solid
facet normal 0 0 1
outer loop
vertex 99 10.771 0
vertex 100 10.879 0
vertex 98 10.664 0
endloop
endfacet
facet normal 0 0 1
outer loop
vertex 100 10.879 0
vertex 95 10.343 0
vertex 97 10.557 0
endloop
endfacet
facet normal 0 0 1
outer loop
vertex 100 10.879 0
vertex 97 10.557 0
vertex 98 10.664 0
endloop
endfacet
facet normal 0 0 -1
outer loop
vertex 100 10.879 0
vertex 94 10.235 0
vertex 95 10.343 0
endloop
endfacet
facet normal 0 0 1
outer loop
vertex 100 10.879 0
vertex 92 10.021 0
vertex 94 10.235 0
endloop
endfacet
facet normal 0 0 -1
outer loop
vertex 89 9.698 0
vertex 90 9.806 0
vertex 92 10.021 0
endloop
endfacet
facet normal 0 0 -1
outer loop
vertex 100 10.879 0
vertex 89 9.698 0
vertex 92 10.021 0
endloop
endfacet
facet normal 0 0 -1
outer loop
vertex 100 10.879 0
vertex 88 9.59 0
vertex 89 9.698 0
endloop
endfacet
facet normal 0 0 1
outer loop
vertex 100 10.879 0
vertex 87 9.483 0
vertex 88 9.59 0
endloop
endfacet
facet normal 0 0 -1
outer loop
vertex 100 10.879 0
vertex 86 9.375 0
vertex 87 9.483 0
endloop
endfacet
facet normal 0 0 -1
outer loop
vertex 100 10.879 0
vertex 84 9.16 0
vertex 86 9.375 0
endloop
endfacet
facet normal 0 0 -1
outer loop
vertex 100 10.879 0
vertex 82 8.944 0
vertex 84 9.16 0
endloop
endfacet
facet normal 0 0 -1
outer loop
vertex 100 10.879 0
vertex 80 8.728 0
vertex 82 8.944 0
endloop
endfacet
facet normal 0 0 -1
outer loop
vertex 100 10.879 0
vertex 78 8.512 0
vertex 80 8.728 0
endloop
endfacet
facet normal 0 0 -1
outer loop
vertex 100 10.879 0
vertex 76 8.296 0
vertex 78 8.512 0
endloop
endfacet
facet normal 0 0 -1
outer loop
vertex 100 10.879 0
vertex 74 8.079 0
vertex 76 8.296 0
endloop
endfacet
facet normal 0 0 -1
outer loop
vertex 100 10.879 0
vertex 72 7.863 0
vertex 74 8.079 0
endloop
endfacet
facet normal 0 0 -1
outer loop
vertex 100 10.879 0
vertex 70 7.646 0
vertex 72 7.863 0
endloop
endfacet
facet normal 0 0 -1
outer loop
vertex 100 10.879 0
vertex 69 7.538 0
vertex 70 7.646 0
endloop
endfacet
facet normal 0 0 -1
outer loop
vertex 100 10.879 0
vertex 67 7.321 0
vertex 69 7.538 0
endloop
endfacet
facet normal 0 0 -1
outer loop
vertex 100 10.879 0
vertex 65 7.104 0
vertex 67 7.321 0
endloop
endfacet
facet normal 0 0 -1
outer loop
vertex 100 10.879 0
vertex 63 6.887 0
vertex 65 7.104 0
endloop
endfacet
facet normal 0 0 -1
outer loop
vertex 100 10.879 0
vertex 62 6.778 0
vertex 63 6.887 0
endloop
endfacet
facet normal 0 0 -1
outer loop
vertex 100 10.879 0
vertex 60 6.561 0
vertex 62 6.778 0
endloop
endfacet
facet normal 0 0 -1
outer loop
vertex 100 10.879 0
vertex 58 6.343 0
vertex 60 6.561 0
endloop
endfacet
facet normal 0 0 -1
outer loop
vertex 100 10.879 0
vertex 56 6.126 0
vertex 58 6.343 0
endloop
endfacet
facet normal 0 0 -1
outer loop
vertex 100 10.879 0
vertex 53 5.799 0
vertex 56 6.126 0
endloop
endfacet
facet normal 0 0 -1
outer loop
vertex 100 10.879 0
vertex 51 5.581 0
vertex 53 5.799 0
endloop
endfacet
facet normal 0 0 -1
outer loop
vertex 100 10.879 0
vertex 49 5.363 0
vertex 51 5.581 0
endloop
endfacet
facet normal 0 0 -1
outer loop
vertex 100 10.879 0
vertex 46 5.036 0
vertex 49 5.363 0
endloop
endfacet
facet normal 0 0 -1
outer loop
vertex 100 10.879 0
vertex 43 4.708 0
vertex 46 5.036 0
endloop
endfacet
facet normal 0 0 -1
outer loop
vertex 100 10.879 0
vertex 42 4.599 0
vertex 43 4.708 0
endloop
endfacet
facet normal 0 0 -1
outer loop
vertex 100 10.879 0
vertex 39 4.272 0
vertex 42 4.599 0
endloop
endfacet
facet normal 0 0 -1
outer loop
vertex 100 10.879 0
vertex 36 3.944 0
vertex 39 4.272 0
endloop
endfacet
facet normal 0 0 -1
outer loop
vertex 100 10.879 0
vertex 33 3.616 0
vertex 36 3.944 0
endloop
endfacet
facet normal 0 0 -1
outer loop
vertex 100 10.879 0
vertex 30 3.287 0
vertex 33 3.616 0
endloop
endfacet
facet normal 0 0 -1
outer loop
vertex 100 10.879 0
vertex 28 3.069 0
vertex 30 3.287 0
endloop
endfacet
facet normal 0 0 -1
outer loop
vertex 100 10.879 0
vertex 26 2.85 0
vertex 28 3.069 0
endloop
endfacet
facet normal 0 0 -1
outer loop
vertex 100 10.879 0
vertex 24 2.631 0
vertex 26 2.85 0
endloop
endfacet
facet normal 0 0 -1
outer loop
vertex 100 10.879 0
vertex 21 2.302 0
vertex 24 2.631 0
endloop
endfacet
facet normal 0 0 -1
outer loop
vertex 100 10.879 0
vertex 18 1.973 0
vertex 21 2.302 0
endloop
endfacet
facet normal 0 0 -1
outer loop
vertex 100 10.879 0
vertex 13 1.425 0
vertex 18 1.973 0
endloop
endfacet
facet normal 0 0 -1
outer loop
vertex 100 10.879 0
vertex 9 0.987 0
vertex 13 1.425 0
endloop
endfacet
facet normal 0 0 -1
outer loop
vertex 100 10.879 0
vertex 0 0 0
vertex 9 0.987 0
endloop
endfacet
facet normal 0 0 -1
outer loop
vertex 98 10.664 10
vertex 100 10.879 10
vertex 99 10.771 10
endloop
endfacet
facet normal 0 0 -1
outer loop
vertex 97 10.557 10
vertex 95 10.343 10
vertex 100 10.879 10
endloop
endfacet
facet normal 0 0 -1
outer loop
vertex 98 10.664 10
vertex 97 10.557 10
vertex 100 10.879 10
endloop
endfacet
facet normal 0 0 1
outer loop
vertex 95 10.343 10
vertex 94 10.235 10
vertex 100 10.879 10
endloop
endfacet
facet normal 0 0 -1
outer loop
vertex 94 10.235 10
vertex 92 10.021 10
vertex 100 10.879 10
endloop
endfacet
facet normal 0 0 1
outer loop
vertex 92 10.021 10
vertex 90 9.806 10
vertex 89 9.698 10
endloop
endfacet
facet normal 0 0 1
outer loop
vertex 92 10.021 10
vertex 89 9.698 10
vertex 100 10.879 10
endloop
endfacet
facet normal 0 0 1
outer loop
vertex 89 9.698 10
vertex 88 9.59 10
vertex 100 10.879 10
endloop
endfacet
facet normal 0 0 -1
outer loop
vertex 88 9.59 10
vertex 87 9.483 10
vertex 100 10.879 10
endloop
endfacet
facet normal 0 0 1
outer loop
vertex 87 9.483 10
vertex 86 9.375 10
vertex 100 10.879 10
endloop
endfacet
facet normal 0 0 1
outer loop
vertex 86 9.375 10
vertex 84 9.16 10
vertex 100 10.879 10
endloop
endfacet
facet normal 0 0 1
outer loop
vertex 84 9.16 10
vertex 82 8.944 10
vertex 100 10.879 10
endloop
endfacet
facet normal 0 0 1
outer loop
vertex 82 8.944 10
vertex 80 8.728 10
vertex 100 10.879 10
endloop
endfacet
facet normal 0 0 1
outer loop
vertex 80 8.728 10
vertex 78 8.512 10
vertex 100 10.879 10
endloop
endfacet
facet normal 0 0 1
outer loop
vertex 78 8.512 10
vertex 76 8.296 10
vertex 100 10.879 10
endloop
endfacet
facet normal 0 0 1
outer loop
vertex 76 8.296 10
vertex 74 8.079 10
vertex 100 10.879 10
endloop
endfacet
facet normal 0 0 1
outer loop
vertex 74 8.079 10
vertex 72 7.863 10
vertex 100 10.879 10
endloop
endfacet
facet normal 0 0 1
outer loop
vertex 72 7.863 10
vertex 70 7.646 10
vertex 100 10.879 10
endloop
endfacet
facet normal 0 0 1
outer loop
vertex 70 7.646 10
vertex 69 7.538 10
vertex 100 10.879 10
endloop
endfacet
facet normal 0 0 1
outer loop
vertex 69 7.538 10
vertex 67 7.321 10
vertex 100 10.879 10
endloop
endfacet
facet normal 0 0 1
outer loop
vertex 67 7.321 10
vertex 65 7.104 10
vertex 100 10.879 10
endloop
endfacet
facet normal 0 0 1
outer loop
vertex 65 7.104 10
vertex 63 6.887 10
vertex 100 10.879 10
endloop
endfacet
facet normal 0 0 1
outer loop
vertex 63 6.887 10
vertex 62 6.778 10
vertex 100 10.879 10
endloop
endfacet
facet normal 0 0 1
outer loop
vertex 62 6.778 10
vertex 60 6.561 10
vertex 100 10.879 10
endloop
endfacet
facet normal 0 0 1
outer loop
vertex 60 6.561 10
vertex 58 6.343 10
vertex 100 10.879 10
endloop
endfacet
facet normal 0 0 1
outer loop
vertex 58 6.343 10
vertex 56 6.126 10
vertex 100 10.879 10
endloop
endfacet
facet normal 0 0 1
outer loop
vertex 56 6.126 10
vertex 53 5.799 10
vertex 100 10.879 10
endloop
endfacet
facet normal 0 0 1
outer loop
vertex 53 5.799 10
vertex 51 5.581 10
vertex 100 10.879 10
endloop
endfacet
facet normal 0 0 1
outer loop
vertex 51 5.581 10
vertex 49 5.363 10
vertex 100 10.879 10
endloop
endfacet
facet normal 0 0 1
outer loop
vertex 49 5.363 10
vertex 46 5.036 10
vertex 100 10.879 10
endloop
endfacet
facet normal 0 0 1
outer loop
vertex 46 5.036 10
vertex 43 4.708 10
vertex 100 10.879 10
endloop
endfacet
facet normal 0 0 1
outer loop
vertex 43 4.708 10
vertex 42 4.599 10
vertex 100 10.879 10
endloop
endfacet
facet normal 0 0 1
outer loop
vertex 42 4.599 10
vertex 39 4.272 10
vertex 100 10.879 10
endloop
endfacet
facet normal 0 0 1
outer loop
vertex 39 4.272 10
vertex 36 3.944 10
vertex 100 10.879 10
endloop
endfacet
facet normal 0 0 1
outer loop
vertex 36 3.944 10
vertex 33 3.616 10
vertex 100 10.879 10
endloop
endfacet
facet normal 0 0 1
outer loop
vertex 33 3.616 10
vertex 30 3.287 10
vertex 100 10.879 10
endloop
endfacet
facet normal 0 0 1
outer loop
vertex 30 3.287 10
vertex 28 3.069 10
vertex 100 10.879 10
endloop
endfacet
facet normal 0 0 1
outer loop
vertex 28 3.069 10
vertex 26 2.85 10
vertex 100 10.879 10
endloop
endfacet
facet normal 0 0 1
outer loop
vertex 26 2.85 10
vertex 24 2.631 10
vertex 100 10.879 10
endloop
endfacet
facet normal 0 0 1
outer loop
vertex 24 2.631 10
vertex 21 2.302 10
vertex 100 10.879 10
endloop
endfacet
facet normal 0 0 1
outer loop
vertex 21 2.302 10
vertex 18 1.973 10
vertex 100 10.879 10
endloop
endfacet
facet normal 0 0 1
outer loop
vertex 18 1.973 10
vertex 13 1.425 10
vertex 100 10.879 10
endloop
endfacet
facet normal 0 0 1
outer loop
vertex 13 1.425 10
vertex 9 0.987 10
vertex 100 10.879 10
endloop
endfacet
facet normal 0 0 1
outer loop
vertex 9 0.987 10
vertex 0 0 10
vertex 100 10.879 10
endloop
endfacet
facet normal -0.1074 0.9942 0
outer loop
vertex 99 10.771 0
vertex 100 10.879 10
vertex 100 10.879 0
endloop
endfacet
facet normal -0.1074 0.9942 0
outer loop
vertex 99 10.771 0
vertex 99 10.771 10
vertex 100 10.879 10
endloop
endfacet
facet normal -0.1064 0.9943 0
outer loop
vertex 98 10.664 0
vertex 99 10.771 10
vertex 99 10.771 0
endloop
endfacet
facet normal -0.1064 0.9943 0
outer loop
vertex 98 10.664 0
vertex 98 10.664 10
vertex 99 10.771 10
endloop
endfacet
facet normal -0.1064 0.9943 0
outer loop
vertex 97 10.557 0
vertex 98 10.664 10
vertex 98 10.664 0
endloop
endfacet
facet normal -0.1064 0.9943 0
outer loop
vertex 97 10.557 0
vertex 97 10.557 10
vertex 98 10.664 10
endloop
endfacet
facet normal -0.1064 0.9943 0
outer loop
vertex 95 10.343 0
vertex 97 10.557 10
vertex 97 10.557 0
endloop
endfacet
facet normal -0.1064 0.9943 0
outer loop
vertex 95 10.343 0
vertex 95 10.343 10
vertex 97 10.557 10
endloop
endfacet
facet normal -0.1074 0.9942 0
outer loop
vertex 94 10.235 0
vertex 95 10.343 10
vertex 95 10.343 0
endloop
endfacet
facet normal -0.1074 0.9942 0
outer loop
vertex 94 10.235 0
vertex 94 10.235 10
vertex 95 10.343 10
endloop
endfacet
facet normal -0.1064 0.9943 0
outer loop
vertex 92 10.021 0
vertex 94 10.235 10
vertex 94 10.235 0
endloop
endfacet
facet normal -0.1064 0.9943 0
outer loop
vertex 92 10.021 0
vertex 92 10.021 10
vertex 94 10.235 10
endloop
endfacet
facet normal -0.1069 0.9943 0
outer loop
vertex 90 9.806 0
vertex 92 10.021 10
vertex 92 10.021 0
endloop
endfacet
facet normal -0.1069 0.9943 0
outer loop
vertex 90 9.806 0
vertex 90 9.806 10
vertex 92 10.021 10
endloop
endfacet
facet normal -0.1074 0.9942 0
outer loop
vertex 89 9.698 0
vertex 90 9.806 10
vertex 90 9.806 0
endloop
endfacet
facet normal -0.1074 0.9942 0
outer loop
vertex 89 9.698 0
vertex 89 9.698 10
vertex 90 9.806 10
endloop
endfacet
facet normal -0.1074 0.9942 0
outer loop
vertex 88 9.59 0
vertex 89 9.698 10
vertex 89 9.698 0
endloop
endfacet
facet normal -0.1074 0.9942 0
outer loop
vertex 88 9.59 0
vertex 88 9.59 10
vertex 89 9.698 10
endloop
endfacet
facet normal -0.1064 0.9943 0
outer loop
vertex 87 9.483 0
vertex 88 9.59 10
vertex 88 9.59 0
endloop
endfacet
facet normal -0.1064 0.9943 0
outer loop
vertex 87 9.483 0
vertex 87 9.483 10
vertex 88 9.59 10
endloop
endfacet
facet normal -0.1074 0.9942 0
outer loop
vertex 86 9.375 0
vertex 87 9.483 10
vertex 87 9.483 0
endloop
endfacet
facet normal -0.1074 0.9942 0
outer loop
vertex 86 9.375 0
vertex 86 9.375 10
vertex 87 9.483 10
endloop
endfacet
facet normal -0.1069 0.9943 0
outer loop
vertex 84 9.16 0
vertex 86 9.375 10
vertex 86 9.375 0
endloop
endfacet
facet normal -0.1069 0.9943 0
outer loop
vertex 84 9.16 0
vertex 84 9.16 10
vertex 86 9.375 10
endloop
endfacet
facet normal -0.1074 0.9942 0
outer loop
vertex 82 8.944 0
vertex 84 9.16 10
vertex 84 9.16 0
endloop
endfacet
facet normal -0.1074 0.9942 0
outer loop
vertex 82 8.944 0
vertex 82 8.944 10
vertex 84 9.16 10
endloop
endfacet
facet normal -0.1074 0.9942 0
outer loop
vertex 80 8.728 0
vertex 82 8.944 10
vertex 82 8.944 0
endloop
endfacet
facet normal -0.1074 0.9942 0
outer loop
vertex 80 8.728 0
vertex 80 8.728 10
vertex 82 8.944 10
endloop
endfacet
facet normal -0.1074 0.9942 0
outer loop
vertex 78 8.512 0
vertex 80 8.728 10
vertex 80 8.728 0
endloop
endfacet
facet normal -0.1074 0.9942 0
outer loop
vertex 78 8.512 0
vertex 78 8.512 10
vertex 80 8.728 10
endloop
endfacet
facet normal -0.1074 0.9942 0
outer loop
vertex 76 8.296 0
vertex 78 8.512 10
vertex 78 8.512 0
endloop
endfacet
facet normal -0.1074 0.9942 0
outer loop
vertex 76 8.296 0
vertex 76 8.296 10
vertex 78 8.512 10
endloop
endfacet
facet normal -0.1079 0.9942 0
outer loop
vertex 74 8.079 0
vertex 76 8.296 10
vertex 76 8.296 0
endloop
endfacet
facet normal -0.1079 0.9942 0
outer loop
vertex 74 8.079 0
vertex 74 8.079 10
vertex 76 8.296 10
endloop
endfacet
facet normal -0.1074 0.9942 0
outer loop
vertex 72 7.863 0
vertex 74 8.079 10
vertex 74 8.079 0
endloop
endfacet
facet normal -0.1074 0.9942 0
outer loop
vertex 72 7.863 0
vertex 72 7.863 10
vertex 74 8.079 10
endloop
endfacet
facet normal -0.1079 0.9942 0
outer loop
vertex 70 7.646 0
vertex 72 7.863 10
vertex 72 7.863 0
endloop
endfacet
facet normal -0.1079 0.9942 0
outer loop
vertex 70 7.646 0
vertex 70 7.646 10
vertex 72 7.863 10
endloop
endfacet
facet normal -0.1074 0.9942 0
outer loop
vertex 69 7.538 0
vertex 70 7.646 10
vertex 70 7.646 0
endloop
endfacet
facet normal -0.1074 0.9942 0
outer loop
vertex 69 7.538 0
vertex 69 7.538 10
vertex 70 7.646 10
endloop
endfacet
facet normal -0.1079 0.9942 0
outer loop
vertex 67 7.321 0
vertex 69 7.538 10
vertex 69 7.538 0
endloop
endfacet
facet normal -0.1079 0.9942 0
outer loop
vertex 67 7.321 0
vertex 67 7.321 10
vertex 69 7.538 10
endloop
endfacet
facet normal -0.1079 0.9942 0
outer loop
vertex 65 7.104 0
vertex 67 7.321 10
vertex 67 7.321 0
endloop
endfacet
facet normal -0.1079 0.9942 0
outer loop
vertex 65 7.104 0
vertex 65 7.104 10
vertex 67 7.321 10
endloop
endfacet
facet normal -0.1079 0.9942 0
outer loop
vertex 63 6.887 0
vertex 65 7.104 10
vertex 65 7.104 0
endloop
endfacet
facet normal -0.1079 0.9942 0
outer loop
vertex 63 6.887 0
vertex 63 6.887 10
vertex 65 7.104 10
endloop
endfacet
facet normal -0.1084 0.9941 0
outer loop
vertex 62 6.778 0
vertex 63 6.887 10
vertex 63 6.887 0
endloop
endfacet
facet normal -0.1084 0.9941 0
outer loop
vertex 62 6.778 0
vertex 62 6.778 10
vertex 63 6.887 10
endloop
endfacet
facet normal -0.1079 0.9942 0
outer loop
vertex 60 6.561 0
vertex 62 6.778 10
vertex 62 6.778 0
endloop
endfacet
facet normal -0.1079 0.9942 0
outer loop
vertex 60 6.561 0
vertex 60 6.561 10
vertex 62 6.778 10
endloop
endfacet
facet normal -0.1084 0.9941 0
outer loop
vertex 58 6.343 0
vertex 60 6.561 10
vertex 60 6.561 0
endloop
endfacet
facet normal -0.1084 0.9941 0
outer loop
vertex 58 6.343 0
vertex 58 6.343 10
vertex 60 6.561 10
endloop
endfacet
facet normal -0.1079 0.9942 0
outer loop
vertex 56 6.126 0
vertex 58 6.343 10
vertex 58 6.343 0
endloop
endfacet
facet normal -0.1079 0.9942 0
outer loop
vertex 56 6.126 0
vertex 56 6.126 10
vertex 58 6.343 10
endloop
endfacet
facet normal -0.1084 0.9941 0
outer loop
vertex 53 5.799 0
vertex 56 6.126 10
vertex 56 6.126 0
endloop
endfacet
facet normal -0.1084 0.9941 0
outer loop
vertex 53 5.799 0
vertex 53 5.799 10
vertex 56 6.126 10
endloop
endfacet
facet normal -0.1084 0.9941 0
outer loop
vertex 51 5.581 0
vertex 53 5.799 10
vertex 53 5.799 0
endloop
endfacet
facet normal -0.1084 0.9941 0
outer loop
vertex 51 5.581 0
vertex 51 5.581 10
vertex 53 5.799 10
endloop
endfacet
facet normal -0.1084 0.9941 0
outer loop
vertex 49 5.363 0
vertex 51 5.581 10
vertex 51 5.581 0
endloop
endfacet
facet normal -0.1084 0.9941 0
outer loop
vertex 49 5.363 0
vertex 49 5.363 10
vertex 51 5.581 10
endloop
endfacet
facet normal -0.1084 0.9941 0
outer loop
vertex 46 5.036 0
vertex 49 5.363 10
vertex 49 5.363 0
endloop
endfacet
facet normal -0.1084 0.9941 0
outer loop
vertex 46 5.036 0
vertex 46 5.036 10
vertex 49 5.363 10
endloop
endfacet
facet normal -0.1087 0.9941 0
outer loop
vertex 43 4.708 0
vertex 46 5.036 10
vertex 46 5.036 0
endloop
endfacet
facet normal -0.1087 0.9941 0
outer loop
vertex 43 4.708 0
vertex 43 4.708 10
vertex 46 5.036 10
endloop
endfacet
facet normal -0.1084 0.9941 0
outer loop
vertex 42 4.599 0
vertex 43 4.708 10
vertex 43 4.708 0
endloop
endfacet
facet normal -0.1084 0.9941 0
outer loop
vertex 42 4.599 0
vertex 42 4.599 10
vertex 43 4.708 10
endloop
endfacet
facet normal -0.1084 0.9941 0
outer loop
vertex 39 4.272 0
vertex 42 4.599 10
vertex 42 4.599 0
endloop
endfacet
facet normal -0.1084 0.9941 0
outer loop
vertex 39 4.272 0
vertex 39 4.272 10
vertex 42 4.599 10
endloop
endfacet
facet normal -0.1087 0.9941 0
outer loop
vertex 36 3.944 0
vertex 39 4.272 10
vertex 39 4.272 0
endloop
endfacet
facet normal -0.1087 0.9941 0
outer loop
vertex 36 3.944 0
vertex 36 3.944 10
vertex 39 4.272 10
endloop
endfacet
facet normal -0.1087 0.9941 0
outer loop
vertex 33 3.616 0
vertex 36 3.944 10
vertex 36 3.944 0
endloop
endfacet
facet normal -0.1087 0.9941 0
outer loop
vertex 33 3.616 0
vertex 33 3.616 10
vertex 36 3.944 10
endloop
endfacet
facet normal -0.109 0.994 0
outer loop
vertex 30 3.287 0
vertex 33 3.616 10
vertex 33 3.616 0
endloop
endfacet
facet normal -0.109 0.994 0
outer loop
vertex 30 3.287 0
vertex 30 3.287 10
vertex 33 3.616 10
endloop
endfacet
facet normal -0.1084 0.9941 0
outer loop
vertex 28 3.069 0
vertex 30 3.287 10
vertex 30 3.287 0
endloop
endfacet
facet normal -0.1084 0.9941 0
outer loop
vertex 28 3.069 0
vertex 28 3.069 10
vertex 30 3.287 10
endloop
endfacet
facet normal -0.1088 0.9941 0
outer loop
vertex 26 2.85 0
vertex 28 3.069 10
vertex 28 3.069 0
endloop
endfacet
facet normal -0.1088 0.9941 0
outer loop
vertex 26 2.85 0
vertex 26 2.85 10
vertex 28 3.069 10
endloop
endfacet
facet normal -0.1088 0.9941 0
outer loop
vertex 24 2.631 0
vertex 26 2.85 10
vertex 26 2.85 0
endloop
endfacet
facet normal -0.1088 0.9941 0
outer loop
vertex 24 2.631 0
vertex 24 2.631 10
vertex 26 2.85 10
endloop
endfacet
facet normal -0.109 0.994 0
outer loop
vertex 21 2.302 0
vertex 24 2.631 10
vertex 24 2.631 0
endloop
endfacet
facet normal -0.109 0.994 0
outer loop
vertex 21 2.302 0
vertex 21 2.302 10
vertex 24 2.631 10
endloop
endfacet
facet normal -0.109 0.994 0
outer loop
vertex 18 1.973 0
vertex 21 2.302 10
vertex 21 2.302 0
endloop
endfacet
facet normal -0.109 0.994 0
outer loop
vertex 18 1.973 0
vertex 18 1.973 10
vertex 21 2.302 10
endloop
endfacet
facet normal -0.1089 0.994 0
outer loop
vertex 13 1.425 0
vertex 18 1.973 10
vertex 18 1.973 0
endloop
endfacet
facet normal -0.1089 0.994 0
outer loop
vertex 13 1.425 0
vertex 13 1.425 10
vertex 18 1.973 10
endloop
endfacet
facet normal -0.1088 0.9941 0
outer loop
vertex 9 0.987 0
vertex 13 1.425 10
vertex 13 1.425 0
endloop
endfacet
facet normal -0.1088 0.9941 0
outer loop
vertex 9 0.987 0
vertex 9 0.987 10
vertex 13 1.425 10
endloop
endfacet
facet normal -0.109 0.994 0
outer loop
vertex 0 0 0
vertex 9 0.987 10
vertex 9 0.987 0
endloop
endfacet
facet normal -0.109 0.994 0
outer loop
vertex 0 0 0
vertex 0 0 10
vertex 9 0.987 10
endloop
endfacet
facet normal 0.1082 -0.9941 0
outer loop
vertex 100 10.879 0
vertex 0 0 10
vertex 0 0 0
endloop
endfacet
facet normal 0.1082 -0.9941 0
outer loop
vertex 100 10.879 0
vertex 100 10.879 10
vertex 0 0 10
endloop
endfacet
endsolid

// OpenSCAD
// Parameter für die Wellenform
wellen_breite = 100; // Gesamtbreite der Wellenform
wellen_hoehe = 50;  // Maximale Höhe der Wellen
wellen_tiefe = 10;  // Dicke der Wellenform
wellen_anzahl = 2;   // Anzahl der Wellen

// Funktion zur Erzeugung einer einzelnen Welle
function welle(x) = wellen_hoehe * sin(x / wellen_breite * 2 * PI * wellen_anzahl);

// Pfad für die Wellenform
path = [
  for (x = [0:wellen_breite])
    [x, welle(x)]
];

// Erzeugung der 3D-Wellenform
linear_extrude(height = wellen_tiefe)
  polygon(points = path);
